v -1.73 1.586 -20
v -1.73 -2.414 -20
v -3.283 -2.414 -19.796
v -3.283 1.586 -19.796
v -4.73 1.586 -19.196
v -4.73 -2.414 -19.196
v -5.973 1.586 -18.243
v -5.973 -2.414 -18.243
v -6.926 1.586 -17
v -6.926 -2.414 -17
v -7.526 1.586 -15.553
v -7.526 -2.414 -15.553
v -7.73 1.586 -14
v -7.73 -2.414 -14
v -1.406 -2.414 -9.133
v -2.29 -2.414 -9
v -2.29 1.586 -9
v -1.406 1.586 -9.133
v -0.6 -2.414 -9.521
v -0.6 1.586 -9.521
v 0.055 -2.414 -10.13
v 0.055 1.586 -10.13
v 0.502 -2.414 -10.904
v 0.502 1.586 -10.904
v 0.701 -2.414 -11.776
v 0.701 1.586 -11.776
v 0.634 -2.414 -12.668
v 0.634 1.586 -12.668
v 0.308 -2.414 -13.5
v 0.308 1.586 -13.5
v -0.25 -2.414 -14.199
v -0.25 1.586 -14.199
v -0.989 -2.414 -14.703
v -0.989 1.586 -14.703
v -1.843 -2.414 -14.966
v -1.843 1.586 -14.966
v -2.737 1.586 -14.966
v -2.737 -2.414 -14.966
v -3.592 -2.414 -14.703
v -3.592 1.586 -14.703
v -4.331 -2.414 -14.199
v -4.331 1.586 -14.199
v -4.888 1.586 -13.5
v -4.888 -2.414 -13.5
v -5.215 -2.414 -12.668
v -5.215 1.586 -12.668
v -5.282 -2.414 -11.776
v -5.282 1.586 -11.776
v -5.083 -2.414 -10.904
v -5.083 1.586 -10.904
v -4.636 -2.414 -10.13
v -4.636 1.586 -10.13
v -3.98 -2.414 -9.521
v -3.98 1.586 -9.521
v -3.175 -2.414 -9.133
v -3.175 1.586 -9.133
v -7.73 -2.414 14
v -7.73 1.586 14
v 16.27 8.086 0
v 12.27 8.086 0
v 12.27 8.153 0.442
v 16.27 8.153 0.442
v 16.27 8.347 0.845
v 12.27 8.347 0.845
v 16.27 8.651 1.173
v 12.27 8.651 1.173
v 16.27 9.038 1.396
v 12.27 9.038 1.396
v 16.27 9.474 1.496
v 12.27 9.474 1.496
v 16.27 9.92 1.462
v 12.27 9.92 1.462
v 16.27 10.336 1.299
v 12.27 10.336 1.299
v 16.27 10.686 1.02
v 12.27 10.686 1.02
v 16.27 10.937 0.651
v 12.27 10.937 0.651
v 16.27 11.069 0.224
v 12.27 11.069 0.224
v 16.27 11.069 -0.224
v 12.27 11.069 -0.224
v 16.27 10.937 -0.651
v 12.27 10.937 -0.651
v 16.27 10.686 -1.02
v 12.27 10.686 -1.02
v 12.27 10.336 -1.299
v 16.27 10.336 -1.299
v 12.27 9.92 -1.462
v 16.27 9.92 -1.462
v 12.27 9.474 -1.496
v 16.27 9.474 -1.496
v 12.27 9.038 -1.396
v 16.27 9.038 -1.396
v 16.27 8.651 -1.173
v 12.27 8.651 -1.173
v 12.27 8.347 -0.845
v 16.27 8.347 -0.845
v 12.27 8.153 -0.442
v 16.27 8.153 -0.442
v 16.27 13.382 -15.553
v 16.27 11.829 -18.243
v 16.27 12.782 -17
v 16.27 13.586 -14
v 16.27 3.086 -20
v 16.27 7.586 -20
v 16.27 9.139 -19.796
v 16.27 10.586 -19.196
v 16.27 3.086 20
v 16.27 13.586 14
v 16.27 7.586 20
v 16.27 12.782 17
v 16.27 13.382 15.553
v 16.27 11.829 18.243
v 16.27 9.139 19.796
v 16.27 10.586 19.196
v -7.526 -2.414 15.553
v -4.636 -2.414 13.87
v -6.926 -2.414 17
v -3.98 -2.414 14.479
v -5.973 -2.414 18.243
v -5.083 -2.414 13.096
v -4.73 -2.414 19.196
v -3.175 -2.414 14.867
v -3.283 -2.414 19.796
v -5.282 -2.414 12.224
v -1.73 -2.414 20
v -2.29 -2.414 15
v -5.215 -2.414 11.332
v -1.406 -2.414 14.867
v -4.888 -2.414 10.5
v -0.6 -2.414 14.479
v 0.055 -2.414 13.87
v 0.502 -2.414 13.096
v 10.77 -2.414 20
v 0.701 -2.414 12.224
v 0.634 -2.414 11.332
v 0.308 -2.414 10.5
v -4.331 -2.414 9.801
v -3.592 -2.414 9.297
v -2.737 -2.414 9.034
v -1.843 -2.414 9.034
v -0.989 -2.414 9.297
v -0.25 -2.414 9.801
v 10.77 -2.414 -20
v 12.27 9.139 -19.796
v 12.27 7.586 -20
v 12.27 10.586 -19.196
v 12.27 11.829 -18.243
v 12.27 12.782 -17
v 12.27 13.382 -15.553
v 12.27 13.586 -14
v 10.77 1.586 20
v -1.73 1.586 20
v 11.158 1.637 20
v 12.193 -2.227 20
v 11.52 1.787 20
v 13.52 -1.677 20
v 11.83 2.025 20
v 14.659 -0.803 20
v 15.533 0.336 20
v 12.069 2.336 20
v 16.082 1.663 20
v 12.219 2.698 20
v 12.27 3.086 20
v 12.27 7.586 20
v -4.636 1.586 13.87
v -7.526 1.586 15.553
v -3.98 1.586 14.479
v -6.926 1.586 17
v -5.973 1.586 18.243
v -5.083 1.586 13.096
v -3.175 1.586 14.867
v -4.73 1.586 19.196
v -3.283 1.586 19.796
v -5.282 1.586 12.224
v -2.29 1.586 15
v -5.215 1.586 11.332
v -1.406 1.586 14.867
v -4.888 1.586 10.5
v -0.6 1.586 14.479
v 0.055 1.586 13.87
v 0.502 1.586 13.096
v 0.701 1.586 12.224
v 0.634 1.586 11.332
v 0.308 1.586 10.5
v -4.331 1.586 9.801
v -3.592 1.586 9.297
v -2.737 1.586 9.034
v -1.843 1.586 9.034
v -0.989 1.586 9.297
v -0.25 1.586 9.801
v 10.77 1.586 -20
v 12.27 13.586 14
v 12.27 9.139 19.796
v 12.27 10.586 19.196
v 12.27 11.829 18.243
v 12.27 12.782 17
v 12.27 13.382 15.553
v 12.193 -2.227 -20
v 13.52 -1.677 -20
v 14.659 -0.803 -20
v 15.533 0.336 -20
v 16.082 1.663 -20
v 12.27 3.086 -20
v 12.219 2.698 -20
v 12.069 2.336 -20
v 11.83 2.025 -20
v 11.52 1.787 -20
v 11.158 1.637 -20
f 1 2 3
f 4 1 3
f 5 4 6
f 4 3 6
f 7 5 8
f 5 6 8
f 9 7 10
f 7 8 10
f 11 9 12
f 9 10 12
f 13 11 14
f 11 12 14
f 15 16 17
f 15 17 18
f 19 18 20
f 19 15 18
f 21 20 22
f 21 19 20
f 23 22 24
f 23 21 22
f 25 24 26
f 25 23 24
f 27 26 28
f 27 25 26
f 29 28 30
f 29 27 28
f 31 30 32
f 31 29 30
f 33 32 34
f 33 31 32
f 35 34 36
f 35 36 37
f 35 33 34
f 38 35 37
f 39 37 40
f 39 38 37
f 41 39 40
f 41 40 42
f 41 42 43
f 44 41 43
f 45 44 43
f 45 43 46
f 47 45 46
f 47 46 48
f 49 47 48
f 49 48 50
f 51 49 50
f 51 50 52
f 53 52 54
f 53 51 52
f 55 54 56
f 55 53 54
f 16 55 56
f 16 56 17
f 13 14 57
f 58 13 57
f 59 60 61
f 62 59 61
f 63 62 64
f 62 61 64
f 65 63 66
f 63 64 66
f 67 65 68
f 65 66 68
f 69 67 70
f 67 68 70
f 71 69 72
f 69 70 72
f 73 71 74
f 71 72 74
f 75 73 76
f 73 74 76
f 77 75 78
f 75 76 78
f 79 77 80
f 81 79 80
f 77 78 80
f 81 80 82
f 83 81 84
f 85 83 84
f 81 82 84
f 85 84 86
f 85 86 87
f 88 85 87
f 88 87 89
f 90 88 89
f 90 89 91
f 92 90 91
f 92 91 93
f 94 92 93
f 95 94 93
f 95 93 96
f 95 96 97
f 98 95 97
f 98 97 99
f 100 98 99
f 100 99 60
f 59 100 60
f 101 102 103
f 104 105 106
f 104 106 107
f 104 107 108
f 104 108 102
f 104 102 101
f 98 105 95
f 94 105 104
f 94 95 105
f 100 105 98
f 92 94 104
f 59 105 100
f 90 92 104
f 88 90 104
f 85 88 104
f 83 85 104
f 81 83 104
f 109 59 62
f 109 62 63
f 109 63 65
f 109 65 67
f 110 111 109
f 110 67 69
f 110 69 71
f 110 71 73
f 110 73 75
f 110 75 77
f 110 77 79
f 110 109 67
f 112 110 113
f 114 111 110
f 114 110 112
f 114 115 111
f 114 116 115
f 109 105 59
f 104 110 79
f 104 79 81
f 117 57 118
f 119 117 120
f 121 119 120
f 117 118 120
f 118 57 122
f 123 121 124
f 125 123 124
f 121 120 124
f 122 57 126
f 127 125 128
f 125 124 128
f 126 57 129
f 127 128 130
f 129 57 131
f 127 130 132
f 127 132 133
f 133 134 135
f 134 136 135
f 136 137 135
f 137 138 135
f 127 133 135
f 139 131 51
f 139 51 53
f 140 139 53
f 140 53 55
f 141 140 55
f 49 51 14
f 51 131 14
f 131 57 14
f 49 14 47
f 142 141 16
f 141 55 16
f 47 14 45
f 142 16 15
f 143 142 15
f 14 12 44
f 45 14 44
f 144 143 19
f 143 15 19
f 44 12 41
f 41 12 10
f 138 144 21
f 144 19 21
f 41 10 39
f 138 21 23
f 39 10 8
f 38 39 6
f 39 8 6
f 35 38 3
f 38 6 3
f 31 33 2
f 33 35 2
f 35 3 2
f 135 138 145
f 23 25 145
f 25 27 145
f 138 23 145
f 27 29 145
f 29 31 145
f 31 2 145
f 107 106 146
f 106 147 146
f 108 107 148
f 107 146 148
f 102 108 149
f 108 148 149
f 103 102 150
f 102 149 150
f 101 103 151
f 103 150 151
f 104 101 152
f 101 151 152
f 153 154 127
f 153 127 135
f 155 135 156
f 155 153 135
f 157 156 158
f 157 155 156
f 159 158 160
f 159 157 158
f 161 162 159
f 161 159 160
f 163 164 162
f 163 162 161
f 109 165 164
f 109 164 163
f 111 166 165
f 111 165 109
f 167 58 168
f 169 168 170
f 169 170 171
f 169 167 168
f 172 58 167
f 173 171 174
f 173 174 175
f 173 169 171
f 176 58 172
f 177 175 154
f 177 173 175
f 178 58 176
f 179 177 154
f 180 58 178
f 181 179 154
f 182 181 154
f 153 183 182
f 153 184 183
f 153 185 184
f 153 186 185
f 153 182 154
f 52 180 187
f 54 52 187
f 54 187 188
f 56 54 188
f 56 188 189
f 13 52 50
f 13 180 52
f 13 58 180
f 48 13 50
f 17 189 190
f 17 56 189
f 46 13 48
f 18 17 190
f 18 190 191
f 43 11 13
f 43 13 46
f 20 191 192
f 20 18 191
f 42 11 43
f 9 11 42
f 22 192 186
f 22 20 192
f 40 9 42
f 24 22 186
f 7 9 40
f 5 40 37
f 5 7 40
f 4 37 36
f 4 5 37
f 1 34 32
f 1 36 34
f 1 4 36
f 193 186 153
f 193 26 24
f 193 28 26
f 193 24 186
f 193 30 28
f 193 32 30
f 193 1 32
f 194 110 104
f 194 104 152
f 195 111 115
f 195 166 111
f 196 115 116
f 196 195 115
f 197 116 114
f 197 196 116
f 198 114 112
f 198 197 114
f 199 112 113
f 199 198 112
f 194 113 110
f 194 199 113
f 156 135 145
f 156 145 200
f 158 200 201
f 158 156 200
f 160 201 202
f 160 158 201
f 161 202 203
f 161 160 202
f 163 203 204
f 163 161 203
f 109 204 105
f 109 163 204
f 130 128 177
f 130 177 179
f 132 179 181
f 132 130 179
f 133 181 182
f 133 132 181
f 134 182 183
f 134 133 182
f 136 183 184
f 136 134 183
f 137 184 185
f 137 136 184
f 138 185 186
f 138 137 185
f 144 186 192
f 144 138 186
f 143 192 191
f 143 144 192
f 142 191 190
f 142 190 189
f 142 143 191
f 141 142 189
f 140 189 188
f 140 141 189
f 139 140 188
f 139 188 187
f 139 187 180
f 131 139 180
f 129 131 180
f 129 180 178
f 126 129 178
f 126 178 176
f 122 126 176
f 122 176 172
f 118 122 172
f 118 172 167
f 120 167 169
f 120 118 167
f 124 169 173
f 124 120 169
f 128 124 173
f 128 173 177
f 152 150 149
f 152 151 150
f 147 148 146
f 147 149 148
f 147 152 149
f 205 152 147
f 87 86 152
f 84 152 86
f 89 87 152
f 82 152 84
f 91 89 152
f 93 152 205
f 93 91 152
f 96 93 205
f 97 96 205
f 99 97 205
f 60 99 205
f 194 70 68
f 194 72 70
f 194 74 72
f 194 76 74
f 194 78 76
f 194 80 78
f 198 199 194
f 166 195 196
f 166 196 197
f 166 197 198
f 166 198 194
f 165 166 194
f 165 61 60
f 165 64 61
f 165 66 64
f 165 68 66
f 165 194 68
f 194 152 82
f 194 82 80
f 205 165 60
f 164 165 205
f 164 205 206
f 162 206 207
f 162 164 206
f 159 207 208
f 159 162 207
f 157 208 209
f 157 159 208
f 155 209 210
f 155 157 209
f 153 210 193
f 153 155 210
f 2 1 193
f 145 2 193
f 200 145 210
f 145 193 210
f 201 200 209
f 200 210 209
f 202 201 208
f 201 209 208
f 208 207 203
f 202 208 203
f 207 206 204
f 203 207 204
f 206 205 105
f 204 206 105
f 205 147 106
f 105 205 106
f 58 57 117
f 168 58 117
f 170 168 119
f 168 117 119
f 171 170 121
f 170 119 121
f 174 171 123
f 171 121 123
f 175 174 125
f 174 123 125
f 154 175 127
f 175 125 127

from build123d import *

# Parameters (mm, degrees)
SKETCH1_R                    = 1.5
BASE_FLANGE1_DEPTH           = 2
EDGE_FLANGE1_STRIP_W         = 9.5
EDGE_FLANGE1_STRIP_H         = 2
EDGE_FLANGE1_STRIP_CUT_DEPTH = 20
EDGE_FLANGE1_DEPTH           = 20
SKETCH9_R                    = 0.75
CUT_EXTRUDE1_DEPTH           = 10
FILLET1_R                    = 3
L_EK1_SCALE                  = 2


# Sheet-metal steps are written as plain solids
with BuildPart() as part:
    # Sketch1 → Base-Flange1 (new body)
    with BuildSketch(Plane(origin=(0, 0, 0), x_dir=(1, 0, 0), z_dir=(0, 1, 0))):
        with BuildLine():
            Line((0, 7), (0, -7))
            ThreePointArc((0, -7), (0.878679656, -9.121320344), (3, -10))
            Line((3, -10), (12, -10))
            Line((12, -10), (12, 10))
            Line((12, 10), (3, 10))
            ThreePointArc((3, 10), (0.878679656, 9.121320344), (0, 7))
        make_face()
        with Locations(Location((2.72, 6, 0), (0, 0, 270))):
            Circle(SKETCH1_R, mode=Mode.SUBTRACT)
        with Locations(Location((2.72, -6, 0), (0, 0, 270))):
            Circle(SKETCH1_R, mode=Mode.SUBTRACT)
    extrude(amount=BASE_FLANGE1_DEPTH)

    # Edge-Flange1 strip (across the edge) → Edge-Flange1 strip cut (cut)
    with BuildSketch(Plane(origin=(12, 2, 10), x_dir=(-1, 0, 0), z_dir=(0, 0, -1))):
        with Locations((-2, -1)):
            Rectangle(EDGE_FLANGE1_STRIP_W, EDGE_FLANGE1_STRIP_H)
    extrude(amount=EDGE_FLANGE1_STRIP_CUT_DEPTH, mode=Mode.SUBTRACT)

    # Edge-Flange1 section (across the edge) → Edge-Flange1 (add)
    with BuildSketch(Plane(origin=(12, 2, 10), x_dir=(-1, 0, 0), z_dir=(0, 0, -1))):
        with BuildLine():
            Line((0, 0.75), (0, 6))
            Line((0, 6), (2, 6))
            Line((2, 6), (2, 0.75))
            ThreePointArc((2, 0.75), (2.219669914, 0.219669914), (2.75, 0))
            Line((2.75, 0), (2.75, -2))
            ThreePointArc((2.75, -2), (0.805456352, -1.194543648), (0, 0.75))
        make_face()
    extrude(amount=EDGE_FLANGE1_DEPTH)

    # Sketch9 → Cut-Extrude1 (cut)
    with BuildSketch(Plane.ZY.offset(-10)):
        with Locations(Location((0, 6, 0), (0, 0, 270))):
            Circle(SKETCH9_R)
    extrude(amount=-CUT_EXTRUDE1_DEPTH, mode=Mode.SUBTRACT)

    # Fillet1
    fillet1_edges = [part.edges().sort_by_distance(p)[0] for p in [
        (11, 8, 10),
        (11, 8, -10),
    ]]
    fillet(fillet1_edges, radius=FILLET1_R)


with BuildPart() as part_1:
    # Ölçek1: scaled about (7.730300008, 2.413989503, 0)
    add(part.part.scale(L_EK1_SCALE).moved(Location((-7.730300008, -2.413989503, 0))))


solid = part_1.part
